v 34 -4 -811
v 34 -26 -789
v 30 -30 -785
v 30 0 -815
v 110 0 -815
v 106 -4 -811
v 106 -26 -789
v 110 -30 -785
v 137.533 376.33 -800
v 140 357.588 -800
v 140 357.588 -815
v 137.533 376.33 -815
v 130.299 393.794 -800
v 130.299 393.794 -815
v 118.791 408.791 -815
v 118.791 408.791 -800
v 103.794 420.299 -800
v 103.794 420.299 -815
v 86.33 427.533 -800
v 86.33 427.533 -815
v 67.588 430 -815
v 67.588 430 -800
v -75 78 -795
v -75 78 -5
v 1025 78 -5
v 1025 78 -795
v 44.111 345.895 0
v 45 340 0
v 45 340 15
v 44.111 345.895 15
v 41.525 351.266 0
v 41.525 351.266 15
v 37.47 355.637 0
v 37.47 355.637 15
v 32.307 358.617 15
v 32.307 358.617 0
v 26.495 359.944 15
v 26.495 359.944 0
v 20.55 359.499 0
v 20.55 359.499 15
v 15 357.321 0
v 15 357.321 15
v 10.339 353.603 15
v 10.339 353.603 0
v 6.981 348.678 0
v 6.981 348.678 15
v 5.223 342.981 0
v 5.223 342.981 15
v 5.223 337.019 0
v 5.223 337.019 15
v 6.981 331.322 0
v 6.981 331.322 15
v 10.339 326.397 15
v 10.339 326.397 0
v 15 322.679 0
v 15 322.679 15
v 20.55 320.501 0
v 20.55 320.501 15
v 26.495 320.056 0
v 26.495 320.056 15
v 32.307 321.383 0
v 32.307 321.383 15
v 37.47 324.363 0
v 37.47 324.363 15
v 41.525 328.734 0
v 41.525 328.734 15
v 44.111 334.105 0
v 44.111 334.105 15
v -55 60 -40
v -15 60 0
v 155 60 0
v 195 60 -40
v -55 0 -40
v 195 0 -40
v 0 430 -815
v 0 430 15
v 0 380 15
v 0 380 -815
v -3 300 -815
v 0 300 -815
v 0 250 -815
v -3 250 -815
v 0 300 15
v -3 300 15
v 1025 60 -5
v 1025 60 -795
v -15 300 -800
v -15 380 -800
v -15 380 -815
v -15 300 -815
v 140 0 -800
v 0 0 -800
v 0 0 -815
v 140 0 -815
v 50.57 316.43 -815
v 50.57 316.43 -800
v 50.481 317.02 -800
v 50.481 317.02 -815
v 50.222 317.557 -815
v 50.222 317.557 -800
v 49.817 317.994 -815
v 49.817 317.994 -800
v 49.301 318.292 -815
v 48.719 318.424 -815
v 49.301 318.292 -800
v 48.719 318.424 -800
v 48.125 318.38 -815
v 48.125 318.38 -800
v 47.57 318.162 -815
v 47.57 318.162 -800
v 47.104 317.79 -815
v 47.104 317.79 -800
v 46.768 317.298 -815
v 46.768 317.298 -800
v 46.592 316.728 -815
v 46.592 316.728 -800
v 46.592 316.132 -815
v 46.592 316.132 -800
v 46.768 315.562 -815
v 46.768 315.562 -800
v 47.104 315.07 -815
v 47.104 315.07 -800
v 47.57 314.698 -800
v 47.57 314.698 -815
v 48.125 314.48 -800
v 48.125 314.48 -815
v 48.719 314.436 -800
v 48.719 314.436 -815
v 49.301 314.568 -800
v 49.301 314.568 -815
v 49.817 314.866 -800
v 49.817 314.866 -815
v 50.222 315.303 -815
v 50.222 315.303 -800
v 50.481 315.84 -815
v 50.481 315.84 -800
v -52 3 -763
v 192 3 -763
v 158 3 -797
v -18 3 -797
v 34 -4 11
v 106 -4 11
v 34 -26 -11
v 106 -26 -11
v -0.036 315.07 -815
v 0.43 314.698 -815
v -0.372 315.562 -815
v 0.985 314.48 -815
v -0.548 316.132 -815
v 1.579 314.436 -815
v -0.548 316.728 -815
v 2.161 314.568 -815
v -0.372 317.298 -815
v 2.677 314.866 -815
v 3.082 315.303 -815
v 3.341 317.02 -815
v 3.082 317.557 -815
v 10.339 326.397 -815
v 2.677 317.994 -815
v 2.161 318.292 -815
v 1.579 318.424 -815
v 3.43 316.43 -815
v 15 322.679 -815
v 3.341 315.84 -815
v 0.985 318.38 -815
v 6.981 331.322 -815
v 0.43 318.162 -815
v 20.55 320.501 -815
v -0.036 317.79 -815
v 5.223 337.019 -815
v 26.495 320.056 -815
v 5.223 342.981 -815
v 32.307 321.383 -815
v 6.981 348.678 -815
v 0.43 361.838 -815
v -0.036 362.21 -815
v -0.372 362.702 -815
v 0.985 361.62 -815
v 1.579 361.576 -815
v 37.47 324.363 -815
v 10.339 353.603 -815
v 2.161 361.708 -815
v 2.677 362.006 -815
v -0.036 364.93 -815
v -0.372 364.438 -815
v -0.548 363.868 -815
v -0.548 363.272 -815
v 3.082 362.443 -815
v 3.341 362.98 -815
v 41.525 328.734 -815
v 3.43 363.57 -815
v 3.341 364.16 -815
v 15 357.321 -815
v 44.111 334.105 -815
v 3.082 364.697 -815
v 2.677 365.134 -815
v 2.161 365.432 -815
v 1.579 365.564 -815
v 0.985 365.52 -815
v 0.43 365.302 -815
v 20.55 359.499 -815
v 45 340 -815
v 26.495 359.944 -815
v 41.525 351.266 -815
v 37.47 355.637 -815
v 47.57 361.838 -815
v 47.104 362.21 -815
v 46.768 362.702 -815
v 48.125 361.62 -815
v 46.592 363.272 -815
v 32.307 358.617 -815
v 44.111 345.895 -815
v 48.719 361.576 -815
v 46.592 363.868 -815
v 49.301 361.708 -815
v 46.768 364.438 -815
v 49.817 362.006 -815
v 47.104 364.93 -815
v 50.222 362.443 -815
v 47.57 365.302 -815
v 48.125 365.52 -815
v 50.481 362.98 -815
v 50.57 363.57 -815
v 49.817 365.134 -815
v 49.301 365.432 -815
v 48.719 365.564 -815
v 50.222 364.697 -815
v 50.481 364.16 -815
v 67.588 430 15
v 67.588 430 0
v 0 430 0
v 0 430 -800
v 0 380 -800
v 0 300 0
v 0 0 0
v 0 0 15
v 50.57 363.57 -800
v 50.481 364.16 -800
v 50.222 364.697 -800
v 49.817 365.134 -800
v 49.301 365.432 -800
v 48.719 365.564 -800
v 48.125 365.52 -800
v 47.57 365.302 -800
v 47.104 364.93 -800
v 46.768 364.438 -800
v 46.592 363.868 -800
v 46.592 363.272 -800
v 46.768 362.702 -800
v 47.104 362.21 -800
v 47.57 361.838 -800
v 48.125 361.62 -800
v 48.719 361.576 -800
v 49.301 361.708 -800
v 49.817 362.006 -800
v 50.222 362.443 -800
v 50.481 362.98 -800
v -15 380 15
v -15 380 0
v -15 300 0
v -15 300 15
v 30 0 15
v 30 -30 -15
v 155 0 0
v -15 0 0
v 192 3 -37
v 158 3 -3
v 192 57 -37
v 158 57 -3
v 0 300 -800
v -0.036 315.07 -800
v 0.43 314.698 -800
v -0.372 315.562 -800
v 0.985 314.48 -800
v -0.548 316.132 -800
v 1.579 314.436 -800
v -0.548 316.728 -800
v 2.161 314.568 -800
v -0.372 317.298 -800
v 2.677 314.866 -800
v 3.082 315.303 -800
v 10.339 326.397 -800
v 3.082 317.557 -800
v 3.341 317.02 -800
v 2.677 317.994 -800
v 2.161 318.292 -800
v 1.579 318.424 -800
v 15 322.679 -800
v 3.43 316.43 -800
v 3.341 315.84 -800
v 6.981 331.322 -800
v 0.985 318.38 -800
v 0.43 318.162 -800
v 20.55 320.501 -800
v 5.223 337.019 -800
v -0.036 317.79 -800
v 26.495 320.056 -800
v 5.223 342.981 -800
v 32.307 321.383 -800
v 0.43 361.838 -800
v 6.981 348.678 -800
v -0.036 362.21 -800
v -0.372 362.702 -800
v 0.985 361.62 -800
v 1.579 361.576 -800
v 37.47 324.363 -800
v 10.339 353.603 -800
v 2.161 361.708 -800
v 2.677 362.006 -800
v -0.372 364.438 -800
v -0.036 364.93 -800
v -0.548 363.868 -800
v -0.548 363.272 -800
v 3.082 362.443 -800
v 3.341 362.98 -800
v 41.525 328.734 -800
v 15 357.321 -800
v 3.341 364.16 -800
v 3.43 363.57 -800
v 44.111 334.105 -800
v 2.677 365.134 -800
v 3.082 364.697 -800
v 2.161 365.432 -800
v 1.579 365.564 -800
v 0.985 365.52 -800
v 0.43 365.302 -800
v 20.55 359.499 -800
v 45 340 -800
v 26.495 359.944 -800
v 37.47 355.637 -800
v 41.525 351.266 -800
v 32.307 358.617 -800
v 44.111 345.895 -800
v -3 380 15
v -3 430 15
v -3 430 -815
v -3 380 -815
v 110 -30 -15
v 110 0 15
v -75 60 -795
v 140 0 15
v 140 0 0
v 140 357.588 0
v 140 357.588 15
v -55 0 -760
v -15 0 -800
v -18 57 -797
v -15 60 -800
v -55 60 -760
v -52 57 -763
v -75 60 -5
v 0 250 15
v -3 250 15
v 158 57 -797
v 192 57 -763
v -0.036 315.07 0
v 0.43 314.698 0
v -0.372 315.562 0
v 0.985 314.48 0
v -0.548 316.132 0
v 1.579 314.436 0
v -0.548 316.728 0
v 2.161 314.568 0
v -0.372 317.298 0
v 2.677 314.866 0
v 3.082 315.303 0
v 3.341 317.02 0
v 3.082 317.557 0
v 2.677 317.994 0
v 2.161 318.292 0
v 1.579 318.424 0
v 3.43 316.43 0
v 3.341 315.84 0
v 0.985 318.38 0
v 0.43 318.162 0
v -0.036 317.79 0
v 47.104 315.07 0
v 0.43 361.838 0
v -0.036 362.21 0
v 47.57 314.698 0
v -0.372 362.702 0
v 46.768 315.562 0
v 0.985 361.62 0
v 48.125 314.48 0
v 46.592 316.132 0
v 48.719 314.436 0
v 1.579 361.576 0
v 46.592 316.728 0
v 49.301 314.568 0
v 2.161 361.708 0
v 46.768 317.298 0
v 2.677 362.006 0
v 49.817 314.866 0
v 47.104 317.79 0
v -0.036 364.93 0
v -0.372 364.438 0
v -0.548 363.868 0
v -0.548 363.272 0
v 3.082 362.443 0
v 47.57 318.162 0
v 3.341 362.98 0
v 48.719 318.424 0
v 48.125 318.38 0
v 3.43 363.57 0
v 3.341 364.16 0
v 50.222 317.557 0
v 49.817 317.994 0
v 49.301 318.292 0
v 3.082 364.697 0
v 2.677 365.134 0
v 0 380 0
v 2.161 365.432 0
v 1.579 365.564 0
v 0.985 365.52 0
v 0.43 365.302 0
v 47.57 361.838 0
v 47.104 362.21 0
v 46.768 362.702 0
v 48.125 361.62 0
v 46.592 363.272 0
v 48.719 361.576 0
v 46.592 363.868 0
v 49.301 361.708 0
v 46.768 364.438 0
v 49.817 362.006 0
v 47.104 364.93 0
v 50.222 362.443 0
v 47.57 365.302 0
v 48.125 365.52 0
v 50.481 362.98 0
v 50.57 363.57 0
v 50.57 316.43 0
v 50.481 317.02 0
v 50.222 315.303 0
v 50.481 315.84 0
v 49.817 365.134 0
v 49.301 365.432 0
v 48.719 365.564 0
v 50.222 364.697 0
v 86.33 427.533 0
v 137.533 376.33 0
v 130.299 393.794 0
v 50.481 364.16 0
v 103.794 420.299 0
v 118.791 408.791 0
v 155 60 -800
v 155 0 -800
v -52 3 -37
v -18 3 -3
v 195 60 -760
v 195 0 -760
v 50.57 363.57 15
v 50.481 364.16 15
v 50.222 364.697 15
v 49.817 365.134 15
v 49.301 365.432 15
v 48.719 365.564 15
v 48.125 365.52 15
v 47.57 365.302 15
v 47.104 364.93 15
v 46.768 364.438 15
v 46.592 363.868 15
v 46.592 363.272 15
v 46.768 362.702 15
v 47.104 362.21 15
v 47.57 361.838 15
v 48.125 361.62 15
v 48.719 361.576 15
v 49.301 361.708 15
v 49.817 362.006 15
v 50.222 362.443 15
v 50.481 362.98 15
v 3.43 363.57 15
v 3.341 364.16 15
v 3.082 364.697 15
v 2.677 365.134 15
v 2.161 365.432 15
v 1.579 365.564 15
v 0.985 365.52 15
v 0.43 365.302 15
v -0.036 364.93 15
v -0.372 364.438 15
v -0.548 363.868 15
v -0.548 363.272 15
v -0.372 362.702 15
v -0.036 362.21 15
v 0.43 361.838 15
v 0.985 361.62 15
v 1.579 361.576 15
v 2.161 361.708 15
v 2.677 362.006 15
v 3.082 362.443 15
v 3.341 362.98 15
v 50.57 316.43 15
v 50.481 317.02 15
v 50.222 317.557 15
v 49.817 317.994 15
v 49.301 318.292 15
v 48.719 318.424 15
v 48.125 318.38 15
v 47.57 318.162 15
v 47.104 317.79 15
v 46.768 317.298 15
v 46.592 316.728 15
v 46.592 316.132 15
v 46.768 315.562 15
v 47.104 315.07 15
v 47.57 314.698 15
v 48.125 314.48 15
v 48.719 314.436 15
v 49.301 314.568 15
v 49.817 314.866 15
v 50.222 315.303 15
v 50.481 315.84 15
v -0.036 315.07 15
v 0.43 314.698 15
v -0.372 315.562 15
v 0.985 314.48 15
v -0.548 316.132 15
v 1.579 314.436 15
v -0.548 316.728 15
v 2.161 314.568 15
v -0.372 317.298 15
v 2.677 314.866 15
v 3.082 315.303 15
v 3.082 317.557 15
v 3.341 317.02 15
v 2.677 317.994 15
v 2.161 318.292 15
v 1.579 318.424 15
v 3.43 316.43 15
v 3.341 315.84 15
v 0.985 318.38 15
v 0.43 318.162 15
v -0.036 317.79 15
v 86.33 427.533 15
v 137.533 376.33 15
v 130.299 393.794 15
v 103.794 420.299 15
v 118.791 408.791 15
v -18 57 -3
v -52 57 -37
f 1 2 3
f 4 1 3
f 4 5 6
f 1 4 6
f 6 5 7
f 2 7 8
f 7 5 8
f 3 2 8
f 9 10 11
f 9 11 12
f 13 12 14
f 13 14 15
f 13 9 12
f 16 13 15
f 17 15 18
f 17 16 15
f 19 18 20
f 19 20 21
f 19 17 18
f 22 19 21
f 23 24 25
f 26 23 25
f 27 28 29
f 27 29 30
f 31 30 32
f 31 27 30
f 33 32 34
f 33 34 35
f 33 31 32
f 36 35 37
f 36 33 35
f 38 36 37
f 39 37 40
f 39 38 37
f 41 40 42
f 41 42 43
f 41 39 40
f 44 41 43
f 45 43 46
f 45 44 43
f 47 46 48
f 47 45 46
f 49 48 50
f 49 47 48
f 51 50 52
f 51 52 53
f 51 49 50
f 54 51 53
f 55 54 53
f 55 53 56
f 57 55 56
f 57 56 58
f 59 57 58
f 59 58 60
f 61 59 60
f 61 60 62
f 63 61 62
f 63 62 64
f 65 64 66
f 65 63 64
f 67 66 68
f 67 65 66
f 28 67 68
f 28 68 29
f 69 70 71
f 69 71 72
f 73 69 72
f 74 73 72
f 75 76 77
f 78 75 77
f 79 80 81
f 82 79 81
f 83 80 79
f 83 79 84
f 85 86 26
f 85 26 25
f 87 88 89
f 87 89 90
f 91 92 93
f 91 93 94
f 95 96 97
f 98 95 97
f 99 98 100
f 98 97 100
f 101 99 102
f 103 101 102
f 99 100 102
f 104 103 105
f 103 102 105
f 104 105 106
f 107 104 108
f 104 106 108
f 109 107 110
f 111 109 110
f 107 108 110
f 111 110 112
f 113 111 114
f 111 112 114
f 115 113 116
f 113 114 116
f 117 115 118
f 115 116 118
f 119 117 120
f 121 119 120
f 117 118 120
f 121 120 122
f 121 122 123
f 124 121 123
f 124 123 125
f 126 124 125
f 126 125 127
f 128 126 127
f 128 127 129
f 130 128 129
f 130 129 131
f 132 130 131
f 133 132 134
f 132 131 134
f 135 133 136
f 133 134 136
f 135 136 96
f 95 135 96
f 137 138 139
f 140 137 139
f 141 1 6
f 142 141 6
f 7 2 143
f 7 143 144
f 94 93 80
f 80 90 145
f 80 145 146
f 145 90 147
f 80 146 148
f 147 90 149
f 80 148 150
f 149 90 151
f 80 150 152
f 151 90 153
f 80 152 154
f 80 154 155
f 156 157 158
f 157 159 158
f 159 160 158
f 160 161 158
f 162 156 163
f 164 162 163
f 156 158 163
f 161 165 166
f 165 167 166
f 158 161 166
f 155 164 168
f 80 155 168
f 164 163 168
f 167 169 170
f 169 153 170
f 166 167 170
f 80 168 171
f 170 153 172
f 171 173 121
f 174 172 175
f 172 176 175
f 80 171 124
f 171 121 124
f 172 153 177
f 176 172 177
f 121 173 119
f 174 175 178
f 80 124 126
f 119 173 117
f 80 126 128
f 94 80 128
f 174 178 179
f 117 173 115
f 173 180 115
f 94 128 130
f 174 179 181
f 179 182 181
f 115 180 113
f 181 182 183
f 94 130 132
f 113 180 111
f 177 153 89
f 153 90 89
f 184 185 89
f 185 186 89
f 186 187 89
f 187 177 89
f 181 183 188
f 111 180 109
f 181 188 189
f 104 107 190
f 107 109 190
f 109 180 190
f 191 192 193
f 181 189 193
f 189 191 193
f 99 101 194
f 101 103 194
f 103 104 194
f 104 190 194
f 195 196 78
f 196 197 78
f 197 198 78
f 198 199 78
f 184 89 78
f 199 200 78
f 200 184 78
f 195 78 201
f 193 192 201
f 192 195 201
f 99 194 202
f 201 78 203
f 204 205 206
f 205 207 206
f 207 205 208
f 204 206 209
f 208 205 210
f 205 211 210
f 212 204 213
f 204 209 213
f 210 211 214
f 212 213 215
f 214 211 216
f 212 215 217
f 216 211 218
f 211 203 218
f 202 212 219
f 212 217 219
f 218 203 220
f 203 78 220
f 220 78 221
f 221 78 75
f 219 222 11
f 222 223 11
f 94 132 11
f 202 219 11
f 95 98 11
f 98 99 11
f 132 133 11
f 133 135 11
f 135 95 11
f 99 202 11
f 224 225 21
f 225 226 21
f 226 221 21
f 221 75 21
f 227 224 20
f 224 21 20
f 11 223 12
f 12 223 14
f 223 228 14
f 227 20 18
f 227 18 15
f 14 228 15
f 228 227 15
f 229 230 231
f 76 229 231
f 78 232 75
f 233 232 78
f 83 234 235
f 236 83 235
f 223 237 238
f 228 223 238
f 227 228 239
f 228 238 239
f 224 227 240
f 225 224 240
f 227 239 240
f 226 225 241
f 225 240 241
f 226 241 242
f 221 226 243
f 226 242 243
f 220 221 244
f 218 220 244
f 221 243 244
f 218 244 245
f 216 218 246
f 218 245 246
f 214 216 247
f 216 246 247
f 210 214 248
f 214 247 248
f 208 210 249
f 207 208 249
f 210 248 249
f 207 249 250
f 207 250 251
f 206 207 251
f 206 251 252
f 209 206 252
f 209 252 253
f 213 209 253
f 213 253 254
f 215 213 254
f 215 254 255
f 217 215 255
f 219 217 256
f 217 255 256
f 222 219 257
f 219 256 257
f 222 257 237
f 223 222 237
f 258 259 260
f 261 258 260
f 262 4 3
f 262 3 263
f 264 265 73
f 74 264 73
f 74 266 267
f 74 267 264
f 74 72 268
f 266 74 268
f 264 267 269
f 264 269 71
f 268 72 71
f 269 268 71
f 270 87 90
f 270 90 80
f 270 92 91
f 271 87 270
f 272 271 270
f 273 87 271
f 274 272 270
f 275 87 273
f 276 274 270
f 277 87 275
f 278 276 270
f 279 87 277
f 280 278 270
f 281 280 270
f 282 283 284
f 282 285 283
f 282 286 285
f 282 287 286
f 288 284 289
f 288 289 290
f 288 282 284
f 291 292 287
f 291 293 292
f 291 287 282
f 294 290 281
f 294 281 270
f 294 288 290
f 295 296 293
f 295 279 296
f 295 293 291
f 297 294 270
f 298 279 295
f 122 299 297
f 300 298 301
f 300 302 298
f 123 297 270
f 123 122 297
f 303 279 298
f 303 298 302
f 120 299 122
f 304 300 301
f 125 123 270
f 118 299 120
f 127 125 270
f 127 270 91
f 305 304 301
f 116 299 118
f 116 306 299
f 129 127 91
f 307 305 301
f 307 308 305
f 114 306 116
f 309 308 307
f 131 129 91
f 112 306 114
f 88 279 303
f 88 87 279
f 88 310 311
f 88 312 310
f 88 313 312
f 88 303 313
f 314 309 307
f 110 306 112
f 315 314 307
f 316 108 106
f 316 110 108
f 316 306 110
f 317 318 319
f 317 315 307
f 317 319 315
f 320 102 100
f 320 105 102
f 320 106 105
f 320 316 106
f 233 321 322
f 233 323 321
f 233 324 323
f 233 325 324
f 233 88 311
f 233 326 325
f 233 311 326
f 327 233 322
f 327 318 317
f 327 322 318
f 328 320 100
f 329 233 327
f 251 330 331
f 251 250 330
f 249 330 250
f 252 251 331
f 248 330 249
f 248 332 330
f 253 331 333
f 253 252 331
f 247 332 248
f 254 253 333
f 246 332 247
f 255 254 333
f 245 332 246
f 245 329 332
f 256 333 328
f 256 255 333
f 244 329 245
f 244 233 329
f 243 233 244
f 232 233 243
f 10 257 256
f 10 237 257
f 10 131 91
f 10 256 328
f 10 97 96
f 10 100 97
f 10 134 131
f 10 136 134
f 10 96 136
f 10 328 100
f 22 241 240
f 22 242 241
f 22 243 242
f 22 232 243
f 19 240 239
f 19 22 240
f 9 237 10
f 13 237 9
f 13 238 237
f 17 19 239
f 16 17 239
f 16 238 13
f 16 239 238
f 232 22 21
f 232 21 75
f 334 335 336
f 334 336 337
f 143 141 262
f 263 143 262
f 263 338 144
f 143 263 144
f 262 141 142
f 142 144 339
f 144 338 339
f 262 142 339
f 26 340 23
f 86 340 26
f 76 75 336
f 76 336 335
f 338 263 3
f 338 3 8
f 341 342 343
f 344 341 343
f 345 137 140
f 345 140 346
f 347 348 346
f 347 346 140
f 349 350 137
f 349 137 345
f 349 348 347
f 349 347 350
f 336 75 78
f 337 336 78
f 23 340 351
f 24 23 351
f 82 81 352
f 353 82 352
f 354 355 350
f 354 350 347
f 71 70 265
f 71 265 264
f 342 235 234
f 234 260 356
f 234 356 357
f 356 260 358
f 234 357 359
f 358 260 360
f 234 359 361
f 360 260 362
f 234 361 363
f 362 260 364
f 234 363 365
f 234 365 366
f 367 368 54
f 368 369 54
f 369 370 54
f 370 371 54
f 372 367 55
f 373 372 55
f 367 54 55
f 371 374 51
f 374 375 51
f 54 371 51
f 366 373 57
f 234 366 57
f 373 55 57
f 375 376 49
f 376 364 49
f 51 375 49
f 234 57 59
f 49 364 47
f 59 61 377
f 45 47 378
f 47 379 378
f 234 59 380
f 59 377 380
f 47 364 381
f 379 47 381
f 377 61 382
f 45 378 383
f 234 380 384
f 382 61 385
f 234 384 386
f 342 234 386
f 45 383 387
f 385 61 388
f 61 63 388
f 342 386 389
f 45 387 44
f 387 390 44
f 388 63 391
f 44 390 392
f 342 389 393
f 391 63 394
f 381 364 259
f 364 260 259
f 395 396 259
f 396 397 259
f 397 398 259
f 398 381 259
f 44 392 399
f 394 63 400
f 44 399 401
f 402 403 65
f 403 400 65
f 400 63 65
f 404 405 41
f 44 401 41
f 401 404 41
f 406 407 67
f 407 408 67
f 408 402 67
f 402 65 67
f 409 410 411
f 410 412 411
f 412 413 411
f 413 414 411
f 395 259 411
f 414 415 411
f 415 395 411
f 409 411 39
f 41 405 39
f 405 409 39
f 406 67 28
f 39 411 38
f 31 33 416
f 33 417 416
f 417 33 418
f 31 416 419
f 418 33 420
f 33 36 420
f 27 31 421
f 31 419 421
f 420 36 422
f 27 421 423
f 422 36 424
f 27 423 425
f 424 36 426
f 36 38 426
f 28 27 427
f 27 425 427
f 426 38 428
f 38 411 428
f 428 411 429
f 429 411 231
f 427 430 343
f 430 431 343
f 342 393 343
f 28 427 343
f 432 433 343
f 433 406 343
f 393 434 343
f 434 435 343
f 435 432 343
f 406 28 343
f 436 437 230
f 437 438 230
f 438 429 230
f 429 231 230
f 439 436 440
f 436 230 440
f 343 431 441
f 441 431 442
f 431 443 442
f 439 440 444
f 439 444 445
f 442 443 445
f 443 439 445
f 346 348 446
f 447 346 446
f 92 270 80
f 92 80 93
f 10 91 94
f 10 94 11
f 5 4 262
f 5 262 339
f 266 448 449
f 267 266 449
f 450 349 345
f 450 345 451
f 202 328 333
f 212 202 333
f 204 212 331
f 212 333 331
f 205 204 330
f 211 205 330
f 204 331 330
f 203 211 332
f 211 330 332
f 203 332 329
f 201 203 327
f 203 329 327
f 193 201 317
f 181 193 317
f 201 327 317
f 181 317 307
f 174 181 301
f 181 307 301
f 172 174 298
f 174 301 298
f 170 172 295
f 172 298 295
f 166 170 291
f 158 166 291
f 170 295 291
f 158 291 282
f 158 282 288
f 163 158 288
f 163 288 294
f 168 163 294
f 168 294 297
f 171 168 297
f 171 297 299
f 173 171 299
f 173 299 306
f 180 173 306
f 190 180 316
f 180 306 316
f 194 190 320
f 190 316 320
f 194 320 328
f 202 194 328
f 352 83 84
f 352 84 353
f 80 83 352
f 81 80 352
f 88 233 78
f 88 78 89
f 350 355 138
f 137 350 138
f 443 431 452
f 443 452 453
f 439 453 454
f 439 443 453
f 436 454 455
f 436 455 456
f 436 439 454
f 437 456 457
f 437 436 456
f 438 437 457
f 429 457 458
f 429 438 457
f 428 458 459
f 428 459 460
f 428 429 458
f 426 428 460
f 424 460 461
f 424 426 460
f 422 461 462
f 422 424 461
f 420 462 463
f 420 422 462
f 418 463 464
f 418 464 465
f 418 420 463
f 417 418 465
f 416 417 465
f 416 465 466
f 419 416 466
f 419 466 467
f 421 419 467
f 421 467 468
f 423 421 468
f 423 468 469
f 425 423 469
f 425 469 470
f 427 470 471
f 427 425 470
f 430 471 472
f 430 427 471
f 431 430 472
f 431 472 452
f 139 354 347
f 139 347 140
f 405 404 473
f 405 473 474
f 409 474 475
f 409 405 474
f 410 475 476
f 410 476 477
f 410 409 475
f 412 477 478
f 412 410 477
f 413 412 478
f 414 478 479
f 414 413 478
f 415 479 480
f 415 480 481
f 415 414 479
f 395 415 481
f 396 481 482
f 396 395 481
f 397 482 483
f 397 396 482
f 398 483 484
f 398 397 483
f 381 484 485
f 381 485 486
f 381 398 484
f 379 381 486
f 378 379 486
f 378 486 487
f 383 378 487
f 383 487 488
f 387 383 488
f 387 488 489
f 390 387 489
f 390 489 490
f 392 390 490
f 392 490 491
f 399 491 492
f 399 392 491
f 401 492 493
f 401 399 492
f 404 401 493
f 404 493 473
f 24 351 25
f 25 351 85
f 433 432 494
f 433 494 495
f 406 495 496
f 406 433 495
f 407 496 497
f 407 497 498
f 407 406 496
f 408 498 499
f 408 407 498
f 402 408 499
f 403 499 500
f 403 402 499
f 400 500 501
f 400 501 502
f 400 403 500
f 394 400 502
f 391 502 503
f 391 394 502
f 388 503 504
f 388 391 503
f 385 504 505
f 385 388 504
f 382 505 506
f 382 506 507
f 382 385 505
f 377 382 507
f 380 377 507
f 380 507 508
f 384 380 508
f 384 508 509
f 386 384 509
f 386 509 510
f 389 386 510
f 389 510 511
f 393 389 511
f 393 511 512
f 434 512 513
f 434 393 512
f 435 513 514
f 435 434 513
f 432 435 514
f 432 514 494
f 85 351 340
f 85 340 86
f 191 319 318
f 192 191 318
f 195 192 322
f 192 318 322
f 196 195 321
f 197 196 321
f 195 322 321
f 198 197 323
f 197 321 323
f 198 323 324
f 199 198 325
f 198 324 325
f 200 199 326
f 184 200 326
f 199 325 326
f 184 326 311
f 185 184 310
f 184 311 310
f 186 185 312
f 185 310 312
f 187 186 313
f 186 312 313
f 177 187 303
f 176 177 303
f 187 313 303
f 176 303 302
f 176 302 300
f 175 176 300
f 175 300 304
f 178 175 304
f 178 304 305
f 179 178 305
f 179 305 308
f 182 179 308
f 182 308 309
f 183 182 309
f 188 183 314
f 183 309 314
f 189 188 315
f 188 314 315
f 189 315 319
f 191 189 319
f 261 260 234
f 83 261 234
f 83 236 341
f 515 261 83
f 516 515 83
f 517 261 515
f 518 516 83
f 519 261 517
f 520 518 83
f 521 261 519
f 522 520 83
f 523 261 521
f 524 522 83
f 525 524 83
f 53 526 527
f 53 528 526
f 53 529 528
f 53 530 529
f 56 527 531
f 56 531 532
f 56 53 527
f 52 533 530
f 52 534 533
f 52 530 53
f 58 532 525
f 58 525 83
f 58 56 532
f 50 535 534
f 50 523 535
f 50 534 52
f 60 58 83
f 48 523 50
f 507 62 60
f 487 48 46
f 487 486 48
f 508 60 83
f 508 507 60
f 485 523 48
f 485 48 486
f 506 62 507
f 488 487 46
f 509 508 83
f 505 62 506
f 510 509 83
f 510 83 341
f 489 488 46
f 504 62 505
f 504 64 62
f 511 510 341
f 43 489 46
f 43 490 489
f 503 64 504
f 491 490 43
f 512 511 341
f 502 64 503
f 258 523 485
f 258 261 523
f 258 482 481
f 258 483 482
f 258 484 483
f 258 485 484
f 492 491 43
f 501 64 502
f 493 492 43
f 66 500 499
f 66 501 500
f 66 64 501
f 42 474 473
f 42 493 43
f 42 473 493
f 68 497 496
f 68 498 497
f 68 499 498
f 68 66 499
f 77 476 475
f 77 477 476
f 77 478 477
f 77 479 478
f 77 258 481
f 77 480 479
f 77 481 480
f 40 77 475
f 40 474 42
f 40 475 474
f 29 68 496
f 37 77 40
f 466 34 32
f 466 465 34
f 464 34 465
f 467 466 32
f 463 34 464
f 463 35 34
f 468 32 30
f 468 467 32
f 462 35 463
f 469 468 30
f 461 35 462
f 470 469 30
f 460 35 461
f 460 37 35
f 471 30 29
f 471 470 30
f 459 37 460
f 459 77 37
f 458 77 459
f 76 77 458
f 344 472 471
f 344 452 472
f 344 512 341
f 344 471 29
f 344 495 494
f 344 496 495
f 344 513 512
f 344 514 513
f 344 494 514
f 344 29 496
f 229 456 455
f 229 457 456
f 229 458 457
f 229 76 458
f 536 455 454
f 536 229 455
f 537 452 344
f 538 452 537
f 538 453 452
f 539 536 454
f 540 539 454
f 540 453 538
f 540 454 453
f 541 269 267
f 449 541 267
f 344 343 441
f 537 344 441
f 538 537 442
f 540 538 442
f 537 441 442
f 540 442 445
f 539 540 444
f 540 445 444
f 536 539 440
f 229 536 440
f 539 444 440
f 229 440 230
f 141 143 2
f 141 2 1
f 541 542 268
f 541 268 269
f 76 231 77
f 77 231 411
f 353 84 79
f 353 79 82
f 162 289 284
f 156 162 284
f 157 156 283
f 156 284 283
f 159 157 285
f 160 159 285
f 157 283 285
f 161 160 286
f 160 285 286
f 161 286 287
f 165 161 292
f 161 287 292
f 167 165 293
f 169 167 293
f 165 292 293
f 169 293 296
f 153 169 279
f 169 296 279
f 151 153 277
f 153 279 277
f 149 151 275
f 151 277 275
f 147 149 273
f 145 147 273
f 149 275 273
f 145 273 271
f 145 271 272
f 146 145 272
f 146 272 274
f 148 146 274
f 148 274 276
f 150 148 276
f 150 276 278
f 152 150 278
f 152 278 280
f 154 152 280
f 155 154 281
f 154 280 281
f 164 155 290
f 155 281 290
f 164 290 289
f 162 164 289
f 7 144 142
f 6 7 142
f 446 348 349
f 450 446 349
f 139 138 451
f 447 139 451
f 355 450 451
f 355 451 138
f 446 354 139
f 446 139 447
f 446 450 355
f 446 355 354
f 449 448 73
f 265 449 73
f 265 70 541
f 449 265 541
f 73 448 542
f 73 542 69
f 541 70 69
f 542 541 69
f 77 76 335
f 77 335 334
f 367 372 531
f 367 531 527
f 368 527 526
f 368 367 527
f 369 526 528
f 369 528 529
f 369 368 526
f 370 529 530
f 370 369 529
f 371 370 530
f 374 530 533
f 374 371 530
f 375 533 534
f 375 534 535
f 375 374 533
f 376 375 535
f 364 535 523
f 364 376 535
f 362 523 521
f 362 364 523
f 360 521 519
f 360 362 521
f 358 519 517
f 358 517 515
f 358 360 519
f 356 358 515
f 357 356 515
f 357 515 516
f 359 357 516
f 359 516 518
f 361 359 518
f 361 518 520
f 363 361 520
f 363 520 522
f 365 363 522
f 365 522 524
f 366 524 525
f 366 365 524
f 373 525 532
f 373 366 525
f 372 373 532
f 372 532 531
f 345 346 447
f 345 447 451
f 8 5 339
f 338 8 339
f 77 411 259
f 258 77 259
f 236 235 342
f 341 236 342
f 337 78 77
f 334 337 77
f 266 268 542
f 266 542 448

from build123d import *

# Parameters (mm, degrees)
F0_R      = 2
F0_R_2    = 20
F1_DEPTH  = 15
F2_W      = 250
F2_H      = 60
F3_DEPTH  = 40
F4_W      = 54
F4_H      = 34
F5_DEPTH  = 250
F7_DEPTH  = 60
F8_W      = 80
F8_H      = 830
F9_DEPTH  = 30
F10_W     = 72
F10_H     = 22
F11_DEPTH = 830
F13_DEPTH = 80
F16_W     = 50
F16_H     = 830
F17_DEPTH = 3
F19_W     = 1100
F19_H     = 790
F20_DEPTH = 18


with BuildPart() as f1:
    # F0 (on Top) → F1 (new body)
    with BuildSketch(Plane.XY):
        with BuildLine():
            Line((0, 300), (0, 0))
            Line((0, 0), (140, 0))
            Line((140, 0), (140, 357.588364))
            ThreePointArc((140, 357.588364), (118.791123, 408.791123), (67.588364, 430))
            Line((67.588364, 430), (0, 430))
            Line((0, 430), (0, 380))
            Line((0, 380), (-15, 380))
            Line((-15, 380), (-15, 300))
            Line((-15, 300), (0, 300))
        make_face()
        with Locations((1.43, 316.43)):
            Circle(F0_R, mode=Mode.SUBTRACT)
        with Locations((48.57, 316.43)):
            Circle(F0_R, mode=Mode.SUBTRACT)
        with Locations((1.43, 363.57)):
            Circle(F0_R, mode=Mode.SUBTRACT)
        with Locations((25, 340)):
            Circle(F0_R_2, mode=Mode.SUBTRACT)
        with Locations((48.57, 363.57)):
            Circle(F0_R, mode=Mode.SUBTRACT)
    extrude(amount=F1_DEPTH)


with BuildPart() as f3:
    # F2 (on Top) → F3 (new body)
    with BuildSketch(Plane.XY):
        with Locations((70, 30)):
            Rectangle(F2_W, F2_H)
    extrude(amount=-F3_DEPTH)

    # F4 (on face) → F5 (cut, through all)
    with BuildSketch(Plane(origin=(-55, 0, 0), x_dir=(0, -1, 0), z_dir=(-1, 0, 0))):
        with Locations((-30, -20)):
            Rectangle(F4_W, F4_H)
    extrude(amount=-F5_DEPTH, mode=Mode.SUBTRACT)

    # F6 (on face) → F7 (cut)
    with BuildSketch(Plane(origin=(0, 60, 0), x_dir=(-1, 0, 0), z_dir=(0, 1, 0))):
        Polygon((-195, 0), (-195, -40), (-155, 0), align=None)
        Polygon((15, 0), (55, -40), (55, 0), align=None)
    extrude(amount=-F7_DEPTH, mode=Mode.SUBTRACT)


with BuildPart() as f9:
    # F8 (on Front) → F9 (new body)
    with BuildSketch(Plane.XZ):
        with Locations((70, -400)):
            Rectangle(F8_W, F8_H)
    extrude(amount=F9_DEPTH)

    # F10 (on face) → F11 (cut, through all)
    with BuildSketch(Plane.XY.offset(15)):
        with Locations((70, -15)):
            Rectangle(F10_W, F10_H)
    extrude(amount=-F11_DEPTH, mode=Mode.SUBTRACT)

    # F12 (on face) → F13 (cut)
    with BuildSketch(Plane.YZ.offset(110)):
        Polygon((-30, 15), (-30, -15), (0, 15), align=None)
        Polygon((0, -815), (-30, -785), (-30, -815), align=None)
    extrude(amount=-F13_DEPTH, mode=Mode.SUBTRACT)


with BuildPart() as f15_1:
    # F15: instance of F3
    add(f3.part.mirror(Plane.XY.offset(-400)))


with BuildPart() as f15_2:
    # F15: instance of F1
    add(f1.part.mirror(Plane.XY.offset(-400)))


with BuildPart() as f17:
    # F16 (on face) → F17 (new body)
    with BuildSketch(Plane(origin=(0, 0, 0), x_dir=(0, -1, 0), z_dir=(-1, 0, 0))):
        with Locations((-405, -400)):
            Rectangle(F16_W, F16_H)
        with Locations((-275, -400)):
            Rectangle(F16_W, F16_H)
    extrude(amount=F17_DEPTH)


with BuildPart() as f20:
    # F19 (on offset) → F20 (new body)
    with BuildSketch(Plane.XZ.offset(-60)):
        with Locations((475, -400)):
            Rectangle(F19_W, F19_H)
    extrude(amount=-F20_DEPTH)


solid = Compound([f1.part, f3.part, f9.part, f15_1.part, f15_2.part, f17.part, f20.part])
